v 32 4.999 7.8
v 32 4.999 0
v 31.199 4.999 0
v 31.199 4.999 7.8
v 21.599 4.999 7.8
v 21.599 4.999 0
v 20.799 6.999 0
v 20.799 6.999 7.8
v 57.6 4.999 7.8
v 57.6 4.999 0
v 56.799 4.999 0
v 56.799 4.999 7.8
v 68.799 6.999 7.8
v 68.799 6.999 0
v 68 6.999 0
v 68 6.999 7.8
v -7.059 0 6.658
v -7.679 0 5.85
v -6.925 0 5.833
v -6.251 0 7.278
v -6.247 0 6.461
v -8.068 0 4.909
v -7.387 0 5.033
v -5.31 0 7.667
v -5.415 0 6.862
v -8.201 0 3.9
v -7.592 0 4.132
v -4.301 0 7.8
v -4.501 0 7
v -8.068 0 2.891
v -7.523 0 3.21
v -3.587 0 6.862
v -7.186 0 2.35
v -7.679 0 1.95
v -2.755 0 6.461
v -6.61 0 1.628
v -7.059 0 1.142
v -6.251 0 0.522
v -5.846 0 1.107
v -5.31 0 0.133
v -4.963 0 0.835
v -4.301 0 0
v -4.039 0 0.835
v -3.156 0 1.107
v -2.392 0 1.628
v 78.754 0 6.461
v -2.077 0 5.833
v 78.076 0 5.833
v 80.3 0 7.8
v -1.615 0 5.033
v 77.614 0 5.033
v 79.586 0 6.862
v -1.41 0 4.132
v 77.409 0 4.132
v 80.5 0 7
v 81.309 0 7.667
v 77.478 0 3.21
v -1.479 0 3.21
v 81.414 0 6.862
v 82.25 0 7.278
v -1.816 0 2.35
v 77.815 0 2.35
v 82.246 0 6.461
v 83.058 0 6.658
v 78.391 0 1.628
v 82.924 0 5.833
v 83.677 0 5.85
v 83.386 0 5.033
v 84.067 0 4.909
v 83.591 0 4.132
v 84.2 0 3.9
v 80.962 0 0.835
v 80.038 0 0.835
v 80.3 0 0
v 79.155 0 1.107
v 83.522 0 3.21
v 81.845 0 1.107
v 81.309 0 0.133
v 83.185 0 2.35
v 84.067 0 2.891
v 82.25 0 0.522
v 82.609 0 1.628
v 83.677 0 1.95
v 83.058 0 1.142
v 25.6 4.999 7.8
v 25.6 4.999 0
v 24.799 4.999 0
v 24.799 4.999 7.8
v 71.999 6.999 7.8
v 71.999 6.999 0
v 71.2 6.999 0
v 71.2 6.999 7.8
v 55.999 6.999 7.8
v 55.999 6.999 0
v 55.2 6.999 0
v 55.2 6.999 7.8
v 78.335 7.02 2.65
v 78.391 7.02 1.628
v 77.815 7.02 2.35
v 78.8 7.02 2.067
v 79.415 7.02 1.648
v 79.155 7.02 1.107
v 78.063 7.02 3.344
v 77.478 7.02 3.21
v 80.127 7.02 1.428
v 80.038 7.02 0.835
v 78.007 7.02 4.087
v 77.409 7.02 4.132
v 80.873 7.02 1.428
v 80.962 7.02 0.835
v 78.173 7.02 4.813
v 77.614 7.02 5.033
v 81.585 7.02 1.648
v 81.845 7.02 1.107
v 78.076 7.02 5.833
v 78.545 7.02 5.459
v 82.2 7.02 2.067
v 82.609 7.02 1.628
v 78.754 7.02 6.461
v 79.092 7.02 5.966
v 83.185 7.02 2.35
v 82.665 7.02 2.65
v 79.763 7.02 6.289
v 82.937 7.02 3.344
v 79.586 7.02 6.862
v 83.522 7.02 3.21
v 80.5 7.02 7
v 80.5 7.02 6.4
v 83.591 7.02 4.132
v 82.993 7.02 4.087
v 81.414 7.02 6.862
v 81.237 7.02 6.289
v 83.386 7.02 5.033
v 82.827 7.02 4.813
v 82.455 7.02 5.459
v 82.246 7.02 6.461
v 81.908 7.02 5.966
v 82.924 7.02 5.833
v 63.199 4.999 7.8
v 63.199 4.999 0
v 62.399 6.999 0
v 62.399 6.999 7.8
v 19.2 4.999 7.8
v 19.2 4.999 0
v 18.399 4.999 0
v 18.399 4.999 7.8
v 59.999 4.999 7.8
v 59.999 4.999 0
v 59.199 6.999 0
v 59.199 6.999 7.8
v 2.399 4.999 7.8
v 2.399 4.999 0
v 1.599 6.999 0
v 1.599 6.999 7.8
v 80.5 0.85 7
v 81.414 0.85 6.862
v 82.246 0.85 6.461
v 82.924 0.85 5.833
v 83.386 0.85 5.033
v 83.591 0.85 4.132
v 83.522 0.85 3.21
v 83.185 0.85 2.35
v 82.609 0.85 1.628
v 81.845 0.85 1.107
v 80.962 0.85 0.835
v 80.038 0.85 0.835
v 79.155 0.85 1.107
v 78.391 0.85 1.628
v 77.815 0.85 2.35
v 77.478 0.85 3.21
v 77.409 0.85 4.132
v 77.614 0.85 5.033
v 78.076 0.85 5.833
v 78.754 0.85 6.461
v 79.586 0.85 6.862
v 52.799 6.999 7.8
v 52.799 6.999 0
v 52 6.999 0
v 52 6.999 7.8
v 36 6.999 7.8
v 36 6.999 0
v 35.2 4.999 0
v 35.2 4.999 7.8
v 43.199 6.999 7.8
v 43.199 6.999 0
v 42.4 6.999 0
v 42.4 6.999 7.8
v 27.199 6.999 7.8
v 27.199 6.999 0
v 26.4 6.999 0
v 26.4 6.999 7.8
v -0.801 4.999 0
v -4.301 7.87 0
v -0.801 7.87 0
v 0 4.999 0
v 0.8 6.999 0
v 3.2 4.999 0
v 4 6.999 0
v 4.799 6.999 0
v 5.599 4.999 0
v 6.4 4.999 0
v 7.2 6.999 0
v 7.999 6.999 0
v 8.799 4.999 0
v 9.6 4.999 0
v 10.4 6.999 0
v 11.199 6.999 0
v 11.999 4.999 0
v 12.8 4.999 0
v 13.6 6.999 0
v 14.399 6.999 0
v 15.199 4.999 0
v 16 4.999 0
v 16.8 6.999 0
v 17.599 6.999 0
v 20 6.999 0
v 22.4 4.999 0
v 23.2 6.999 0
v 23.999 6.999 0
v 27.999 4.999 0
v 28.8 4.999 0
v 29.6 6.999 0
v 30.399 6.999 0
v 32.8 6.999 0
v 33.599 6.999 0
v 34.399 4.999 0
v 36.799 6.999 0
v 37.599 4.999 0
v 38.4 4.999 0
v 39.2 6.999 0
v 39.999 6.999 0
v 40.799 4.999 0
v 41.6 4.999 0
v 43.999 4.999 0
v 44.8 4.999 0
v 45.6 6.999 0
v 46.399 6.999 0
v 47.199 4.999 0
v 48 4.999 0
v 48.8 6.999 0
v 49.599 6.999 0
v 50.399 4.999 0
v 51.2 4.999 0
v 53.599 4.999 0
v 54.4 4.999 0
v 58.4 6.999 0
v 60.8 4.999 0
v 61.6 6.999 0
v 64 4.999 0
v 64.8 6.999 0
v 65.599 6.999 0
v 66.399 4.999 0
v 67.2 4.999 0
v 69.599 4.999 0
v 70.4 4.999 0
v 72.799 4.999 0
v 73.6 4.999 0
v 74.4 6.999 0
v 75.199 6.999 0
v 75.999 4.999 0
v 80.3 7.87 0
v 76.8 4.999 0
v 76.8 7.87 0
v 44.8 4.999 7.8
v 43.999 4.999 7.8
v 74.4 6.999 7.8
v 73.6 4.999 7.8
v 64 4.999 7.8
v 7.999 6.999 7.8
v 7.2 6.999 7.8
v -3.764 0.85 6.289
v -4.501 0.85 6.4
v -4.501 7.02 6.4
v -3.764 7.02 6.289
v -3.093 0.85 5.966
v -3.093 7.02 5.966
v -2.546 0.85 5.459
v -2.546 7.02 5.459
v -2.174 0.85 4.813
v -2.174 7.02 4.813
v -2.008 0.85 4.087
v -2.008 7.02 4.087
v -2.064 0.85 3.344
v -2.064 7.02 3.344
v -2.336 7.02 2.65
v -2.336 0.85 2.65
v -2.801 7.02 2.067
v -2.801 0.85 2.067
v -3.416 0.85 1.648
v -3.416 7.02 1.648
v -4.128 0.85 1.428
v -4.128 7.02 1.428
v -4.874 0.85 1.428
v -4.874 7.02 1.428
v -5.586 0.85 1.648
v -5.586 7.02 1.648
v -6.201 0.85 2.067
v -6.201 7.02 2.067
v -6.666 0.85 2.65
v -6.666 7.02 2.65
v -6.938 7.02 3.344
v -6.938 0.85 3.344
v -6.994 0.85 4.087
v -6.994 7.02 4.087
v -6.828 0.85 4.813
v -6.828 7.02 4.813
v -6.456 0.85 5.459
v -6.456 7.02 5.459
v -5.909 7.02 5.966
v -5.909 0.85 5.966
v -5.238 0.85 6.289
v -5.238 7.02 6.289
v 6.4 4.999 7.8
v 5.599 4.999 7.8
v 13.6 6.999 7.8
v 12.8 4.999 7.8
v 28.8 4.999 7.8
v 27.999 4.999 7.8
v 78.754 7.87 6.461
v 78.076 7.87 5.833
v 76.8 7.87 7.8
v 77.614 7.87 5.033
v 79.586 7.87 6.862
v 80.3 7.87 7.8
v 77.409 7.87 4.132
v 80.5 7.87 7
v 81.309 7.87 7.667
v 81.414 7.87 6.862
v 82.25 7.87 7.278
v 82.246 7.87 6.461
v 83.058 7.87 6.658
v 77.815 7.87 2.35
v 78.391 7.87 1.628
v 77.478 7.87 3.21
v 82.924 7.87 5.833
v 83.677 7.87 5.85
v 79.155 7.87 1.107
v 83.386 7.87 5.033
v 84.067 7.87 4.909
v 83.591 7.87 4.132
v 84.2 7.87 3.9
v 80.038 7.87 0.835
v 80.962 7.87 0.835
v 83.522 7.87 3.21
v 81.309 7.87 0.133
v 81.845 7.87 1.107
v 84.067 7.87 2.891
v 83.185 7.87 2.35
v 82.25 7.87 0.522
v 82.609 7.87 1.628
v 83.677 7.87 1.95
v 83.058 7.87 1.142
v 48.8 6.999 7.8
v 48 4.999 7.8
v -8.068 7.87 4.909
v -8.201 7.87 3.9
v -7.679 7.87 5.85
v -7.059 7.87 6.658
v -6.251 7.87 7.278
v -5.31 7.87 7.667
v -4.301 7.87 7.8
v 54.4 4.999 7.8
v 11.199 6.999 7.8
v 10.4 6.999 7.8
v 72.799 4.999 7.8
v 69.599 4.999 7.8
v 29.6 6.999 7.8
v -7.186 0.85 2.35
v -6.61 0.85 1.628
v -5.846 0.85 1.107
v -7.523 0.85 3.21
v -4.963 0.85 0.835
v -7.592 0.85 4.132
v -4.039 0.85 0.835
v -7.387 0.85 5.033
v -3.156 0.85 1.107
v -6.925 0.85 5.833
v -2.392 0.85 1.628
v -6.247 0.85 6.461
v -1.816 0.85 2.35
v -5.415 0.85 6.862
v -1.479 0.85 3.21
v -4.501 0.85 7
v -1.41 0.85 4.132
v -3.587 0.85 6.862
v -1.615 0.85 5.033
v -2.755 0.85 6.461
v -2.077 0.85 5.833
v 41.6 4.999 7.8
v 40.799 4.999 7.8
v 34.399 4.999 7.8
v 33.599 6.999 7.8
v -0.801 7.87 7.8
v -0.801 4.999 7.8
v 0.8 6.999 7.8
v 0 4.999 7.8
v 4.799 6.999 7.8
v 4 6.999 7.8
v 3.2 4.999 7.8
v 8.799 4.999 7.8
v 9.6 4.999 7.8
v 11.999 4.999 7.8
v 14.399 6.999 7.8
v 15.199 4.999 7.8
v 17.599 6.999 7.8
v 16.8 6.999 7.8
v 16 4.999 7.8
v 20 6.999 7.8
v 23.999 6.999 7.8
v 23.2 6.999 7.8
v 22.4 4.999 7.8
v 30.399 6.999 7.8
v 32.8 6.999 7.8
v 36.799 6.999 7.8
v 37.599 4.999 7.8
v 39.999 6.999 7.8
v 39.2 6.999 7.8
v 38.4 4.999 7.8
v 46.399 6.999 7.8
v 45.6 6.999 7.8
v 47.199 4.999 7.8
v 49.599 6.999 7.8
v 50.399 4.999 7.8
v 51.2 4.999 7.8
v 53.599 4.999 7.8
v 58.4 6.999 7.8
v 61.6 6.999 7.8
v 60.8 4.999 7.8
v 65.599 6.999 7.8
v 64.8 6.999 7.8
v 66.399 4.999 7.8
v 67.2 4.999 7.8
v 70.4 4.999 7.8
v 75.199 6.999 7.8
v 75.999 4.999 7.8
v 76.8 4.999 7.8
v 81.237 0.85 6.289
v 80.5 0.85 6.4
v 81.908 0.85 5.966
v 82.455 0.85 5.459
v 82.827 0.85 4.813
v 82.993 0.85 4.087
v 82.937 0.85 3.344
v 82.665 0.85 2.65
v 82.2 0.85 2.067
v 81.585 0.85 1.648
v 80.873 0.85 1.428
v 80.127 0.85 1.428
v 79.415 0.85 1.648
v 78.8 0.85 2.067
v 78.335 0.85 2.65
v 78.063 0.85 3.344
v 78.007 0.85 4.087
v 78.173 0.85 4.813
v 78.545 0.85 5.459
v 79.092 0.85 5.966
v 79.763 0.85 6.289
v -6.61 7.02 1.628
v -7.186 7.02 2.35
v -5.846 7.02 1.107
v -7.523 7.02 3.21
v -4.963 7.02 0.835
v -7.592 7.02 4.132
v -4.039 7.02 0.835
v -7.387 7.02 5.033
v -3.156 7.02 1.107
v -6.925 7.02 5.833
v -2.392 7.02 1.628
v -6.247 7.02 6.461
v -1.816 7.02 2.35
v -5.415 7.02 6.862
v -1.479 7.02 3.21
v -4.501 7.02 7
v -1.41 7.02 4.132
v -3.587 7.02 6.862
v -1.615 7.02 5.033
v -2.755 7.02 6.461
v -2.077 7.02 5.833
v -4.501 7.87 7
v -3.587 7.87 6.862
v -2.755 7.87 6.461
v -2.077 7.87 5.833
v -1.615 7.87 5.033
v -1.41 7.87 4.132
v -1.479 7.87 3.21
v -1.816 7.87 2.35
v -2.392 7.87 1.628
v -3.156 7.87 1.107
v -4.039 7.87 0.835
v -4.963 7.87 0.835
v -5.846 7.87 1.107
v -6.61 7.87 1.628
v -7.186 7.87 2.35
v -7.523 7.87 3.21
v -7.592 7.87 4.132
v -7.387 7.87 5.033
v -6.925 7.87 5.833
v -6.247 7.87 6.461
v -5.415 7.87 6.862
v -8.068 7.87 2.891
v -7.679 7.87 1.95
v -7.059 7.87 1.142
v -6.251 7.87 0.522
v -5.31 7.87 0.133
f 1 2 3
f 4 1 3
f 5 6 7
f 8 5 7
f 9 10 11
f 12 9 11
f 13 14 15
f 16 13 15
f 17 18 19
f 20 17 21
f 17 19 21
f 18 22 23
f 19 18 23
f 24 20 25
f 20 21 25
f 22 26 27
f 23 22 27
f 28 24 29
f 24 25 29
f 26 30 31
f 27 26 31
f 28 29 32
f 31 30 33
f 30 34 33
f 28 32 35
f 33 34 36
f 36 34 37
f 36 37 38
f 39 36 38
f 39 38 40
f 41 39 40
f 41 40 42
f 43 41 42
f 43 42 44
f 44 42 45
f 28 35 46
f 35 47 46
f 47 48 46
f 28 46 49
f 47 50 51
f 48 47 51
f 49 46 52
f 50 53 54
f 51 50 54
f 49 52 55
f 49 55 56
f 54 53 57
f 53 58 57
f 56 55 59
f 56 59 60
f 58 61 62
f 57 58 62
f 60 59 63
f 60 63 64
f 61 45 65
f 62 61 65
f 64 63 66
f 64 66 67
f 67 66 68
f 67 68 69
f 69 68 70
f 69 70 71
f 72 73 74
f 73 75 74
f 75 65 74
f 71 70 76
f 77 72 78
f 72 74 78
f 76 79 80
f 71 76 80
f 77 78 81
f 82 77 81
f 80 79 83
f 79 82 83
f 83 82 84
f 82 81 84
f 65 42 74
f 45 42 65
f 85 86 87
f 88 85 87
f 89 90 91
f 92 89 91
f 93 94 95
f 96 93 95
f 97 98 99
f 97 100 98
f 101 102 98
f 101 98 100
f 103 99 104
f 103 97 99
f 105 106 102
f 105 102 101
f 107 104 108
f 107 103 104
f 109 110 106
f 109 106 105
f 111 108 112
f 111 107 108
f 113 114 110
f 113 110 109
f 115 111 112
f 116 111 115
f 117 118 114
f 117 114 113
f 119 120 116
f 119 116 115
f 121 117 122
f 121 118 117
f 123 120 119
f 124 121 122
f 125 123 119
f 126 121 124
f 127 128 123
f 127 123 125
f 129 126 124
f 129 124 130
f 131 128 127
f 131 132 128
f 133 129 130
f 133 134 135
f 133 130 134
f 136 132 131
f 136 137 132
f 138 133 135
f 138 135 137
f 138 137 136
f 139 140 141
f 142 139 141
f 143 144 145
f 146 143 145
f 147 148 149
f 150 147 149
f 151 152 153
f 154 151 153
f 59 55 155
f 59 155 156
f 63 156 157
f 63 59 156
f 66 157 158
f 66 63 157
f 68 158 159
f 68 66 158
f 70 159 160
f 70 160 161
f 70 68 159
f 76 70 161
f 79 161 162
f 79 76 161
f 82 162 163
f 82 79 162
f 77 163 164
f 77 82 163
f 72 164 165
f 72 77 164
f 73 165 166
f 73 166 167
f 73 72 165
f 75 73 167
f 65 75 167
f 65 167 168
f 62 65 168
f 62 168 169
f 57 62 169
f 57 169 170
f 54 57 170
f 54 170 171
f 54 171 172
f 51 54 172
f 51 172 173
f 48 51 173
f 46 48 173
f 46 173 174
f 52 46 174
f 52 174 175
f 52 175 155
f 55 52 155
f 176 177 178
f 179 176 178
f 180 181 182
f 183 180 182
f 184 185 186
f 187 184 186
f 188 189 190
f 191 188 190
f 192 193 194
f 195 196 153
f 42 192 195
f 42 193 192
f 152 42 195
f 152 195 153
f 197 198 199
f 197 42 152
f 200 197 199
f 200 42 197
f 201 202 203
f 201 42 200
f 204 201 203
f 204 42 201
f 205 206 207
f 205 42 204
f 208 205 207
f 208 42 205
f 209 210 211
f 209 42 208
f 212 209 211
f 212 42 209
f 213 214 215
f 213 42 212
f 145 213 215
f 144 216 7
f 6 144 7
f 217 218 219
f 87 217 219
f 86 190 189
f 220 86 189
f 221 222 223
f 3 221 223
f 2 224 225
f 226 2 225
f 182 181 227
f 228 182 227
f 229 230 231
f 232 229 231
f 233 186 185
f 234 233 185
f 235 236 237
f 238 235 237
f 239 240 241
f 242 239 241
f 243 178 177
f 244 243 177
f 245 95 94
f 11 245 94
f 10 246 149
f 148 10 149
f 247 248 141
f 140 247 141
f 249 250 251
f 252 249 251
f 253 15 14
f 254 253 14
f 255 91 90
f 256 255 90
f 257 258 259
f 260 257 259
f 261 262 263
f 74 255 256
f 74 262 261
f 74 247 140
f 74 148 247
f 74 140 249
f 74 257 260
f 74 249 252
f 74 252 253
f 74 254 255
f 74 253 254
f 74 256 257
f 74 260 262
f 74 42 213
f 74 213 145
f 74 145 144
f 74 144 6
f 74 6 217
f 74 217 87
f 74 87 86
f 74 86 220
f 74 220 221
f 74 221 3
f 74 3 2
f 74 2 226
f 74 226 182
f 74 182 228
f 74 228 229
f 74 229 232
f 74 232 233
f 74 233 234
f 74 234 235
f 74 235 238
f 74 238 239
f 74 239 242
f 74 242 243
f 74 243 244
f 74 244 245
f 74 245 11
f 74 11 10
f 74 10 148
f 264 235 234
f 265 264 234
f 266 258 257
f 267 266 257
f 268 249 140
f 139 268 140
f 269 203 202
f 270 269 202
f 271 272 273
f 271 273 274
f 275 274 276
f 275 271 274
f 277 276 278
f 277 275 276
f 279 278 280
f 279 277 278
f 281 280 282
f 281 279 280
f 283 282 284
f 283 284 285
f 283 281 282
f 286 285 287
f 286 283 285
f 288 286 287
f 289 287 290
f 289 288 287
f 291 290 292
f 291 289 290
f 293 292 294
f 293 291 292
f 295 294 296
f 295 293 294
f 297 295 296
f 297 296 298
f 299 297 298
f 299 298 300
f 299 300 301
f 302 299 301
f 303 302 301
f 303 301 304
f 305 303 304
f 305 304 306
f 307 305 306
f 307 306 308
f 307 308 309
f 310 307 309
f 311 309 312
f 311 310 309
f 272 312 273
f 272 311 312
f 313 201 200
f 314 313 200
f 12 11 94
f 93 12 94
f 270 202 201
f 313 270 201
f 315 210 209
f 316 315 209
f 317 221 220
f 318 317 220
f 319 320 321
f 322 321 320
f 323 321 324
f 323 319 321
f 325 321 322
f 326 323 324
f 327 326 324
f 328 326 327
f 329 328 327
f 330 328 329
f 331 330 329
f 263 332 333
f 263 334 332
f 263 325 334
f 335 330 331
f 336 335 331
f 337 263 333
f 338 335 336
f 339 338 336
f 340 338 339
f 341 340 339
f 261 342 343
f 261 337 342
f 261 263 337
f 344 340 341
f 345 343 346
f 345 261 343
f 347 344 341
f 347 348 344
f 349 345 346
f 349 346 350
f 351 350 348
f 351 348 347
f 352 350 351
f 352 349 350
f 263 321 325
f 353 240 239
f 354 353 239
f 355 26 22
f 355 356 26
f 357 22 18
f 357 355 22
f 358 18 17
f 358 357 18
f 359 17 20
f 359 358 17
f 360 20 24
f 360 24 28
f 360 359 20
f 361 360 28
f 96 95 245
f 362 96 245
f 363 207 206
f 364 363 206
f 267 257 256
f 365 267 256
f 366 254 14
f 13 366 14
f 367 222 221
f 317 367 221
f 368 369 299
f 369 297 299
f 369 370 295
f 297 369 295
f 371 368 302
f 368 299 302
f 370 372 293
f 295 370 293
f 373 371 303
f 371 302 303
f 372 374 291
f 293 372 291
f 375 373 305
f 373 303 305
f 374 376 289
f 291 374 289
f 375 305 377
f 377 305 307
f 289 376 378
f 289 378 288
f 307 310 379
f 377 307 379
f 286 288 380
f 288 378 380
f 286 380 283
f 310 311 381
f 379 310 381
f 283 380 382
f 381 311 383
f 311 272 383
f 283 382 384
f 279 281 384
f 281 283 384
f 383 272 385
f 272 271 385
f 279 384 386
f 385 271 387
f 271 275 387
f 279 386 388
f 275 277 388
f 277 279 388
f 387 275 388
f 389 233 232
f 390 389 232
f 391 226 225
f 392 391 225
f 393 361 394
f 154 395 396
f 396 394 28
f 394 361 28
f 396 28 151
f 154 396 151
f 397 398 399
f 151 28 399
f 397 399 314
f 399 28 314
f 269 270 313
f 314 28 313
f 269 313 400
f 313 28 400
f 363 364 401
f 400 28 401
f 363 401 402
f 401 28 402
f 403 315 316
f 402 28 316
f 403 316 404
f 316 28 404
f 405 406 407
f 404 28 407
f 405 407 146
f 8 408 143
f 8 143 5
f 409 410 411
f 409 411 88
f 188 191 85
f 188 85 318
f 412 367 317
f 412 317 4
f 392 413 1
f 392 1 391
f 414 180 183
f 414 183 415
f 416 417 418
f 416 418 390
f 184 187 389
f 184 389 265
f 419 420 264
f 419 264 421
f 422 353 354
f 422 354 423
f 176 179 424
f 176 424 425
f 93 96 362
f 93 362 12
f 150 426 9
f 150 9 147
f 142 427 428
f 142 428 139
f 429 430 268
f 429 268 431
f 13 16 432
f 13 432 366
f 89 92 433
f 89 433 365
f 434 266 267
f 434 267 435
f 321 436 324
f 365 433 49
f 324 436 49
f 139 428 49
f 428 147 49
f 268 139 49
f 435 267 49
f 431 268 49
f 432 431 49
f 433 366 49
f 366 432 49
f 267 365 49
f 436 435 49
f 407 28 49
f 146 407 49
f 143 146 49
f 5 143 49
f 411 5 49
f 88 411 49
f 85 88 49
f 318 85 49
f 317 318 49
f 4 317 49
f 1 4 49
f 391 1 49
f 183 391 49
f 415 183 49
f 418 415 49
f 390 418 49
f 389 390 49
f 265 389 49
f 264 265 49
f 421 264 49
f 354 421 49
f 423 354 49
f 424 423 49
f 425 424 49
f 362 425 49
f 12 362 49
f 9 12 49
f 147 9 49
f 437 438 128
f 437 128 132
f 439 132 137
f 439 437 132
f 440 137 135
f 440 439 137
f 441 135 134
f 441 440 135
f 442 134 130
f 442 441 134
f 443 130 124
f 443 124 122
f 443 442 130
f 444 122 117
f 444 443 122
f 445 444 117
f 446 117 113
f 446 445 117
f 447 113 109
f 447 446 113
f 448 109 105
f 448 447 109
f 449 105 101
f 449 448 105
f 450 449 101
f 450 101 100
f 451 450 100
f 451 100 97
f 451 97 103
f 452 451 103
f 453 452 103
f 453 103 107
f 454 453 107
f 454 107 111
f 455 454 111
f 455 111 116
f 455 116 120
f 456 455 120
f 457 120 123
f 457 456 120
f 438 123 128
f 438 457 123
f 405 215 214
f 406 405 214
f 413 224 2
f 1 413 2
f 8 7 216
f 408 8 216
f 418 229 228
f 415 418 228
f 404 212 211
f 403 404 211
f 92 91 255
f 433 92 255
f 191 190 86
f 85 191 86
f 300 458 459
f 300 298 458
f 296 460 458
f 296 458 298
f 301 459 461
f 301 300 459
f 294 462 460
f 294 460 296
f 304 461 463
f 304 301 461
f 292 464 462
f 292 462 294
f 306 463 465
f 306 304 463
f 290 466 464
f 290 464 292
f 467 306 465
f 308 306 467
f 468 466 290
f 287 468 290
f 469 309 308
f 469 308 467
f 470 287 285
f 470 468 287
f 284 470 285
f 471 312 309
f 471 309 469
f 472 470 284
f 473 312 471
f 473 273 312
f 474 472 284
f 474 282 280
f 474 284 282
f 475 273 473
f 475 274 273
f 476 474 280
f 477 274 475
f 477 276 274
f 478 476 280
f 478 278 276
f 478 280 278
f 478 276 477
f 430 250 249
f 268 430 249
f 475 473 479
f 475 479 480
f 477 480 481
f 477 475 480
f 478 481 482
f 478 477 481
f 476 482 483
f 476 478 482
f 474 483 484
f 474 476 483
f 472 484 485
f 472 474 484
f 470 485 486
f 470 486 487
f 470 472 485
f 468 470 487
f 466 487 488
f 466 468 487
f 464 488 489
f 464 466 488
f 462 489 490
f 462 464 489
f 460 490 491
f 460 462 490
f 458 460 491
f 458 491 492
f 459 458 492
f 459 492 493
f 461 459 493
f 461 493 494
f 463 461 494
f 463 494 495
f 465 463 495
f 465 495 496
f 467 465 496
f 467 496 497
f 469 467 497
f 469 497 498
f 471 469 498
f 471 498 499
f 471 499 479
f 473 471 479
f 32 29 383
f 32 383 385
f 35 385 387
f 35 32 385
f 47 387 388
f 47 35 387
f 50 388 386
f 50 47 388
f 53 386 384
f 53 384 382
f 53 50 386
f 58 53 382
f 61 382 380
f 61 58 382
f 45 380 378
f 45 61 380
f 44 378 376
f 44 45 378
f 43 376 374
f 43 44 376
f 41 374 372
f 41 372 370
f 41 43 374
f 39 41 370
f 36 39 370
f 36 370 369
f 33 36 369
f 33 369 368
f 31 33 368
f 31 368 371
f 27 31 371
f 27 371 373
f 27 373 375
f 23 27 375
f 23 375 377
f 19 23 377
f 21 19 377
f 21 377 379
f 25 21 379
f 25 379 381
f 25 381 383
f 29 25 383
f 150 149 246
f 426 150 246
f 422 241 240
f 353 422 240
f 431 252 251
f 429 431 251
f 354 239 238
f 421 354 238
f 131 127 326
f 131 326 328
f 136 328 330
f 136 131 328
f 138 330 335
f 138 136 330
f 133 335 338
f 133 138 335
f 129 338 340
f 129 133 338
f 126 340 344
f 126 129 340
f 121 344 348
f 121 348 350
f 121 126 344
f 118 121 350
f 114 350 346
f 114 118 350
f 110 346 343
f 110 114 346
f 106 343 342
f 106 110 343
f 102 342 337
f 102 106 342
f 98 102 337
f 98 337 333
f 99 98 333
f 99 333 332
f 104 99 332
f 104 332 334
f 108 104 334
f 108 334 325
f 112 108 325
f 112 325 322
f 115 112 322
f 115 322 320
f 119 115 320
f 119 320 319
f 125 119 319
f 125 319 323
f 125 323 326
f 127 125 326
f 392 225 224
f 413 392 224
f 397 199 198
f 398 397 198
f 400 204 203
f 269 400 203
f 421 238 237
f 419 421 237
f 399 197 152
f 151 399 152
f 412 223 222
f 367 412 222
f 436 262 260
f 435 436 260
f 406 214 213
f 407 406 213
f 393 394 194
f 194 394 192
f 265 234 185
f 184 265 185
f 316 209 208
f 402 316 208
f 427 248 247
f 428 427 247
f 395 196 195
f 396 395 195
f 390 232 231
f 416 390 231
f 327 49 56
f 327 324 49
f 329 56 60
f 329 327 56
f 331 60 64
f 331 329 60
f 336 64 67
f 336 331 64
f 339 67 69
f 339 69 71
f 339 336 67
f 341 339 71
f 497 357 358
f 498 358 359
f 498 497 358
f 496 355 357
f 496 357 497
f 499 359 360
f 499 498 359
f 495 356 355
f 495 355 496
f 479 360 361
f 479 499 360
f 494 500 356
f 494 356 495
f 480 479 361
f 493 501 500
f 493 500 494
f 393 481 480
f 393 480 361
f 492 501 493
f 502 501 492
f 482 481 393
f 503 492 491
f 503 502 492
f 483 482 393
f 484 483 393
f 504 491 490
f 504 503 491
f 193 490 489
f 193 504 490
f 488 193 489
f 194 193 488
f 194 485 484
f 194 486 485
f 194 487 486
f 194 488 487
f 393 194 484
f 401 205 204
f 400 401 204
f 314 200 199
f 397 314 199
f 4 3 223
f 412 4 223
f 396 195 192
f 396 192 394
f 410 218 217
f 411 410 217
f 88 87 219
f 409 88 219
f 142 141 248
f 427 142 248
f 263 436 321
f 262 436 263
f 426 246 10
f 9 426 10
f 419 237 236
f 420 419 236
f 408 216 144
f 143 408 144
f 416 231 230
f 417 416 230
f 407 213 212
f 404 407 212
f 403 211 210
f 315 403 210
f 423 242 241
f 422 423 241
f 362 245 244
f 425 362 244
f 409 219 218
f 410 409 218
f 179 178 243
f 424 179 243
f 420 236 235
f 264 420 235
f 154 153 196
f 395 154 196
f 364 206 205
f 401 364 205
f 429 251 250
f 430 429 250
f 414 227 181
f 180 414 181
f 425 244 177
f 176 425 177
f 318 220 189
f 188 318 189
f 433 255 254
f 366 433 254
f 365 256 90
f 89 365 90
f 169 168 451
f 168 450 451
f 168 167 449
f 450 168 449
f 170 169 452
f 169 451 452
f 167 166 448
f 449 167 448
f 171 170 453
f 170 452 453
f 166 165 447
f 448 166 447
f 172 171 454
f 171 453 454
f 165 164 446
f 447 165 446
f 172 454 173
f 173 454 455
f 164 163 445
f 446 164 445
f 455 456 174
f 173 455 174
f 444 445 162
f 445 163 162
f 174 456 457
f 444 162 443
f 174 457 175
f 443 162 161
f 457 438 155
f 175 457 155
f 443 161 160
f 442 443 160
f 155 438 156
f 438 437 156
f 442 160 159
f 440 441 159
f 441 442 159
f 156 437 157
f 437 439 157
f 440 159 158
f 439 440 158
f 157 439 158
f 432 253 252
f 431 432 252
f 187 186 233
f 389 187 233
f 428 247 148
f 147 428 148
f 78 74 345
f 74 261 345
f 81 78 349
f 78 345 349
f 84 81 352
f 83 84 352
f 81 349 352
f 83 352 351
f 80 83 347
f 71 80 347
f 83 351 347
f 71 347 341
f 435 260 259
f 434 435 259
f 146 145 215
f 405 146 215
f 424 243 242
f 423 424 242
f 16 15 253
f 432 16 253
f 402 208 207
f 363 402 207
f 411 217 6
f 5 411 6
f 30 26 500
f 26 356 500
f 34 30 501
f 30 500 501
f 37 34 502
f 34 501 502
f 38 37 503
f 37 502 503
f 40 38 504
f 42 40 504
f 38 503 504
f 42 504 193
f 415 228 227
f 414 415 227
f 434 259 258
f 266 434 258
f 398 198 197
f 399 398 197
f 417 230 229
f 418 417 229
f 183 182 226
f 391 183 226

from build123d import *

# Parameters (mm, degrees)
SALIENTE_EXTRUIR1_DEPTH = 7.8
MATRIZL1_DEPTH          = 7.8
CROQUIS2_W              = 7.8
CROQUIS2_H              = 4.999
SALIENTE_EXTRUIR2_DEPTH = 0.801
CROQUIS4_W              = 7.4
CROQUIS4_H              = 7.8
CROQUIS4_R              = 3.1
SALIENTE_EXTRUIR3_DEPTH = 7.87
SALIENTE_EXTRUIR4_START = 0.85
CROQUIS4_3_R            = 3.1
CROQUIS4_3_R_2          = 2.5
SALIENTE_EXTRUIR4_DEPTH = 6.17
REDONDEO2_R             = 3.9


with BuildPart() as part:
    # Croquis1 → Saliente-Extruir1 (new body)
    with BuildSketch(Plane.XY):
        Polygon((0, 0), (3.199966839, 0), (3.199966839, 4.999), (2.398966839, 4.999), (1.598983419, 6.999), (0.799983419, 6.999), (0, 4.999), align=None)
    extrude(amount=SALIENTE_EXTRUIR1_DEPTH)

    # MatrizL1: read off the stored shape, not the designer's step
    # MatrizL1 outline → MatrizL1 (add)
    with BuildSketch(Plane.XY):
        Polygon((0.799983419, 6.999), (0, 4.999), (0, 0), (76.799966839, 0), (76.799966839, 4.999), (75.998966839, 4.999), (75.198983419, 6.999), (74.399983419, 6.999), (73.6, 4.999), (72.798966839, 4.999), (71.998983419, 6.999), (71.199983419, 6.999), (70.4, 4.999), (69.598966839, 4.999), (68.798983419, 6.999), (67.999983419, 6.999), (67.2, 4.999), (66.398966839, 4.999), (65.598983419, 6.999), (64.799983419, 6.999), (64, 4.999), (63.198966839, 4.999), (62.398983419, 6.999), (61.599983419, 6.999), (60.8, 4.999), (59.998966839, 4.999), (59.198983419, 6.999), (58.399983419, 6.999), (57.6, 4.999), (56.798966839, 4.999), (55.998983419, 6.999), (55.199983419, 6.999), (54.4, 4.999), (53.598966839, 4.999), (52.798983419, 6.999), (51.999983419, 6.999), (51.2, 4.999), (50.398966839, 4.999), (49.598983419, 6.999), (48.799983419, 6.999), (48, 4.999), (47.198966839, 4.999), (46.398983419, 6.999), (45.599983419, 6.999), (44.8, 4.999), (43.998966839, 4.999), (43.198983419, 6.999), (42.399983419, 6.999), (41.6, 4.999), (40.798966839, 4.999), (39.998983419, 6.999), (39.199983419, 6.999), (38.4, 4.999), (37.598966839, 4.999), (36.798983419, 6.999), (35.999983419, 6.999), (35.2, 4.999), (34.398966839, 4.999), (33.598983419, 6.999), (32.799983419, 6.999), (32, 4.999), (31.198966839, 4.999), (30.398983419, 6.999), (29.599983419, 6.999), (28.8, 4.999), (27.998966839, 4.999), (27.198983419, 6.999), (26.399983419, 6.999), (25.6, 4.999), (24.798966839, 4.999), (23.998983419, 6.999), (23.199983419, 6.999), (22.4, 4.999), (21.598966839, 4.999), (20.798983419, 6.999), (19.999983419, 6.999), (19.2, 4.999), (18.398966839, 4.999), (17.598983419, 6.999), (16.799983419, 6.999), (16, 4.999), (15.198966839, 4.999), (14.398983419, 6.999), (13.599983419, 6.999), (12.8, 4.999), (11.998966839, 4.999), (11.198983419, 6.999), (10.399983419, 6.999), (9.6, 4.999), (8.798966839, 4.999), (7.998983419, 6.999), (7.199983419, 6.999), (6.4, 4.999), (5.598966839, 4.999), (4.798983419, 6.999), (3.999983419, 6.999), (3.2, 4.999), (2.398966839, 4.999), (1.598983419, 6.999), align=None)
    extrude(amount=MATRIZL1_DEPTH)

    # Croquis2 → Saliente-Extruir2 (add)
    with BuildSketch(Plane.ZY):
        with Locations((3.9, 2.4995)):
            Rectangle(CROQUIS2_W, CROQUIS2_H)
    extrude(amount=SALIENTE_EXTRUIR2_DEPTH)

    # Croquis4 → Saliente-Extruir3 (add)
    # profile 1 of 2: a face of its own
    with BuildSketch(Plane(origin=(0, 0, 0), x_dir=(1, 0, 0), z_dir=(0, 1, 0))):
        with Locations((-4.501, -3.9)):
            Rectangle(CROQUIS4_W, CROQUIS4_H)
        with Locations(Location((-4.501, -3.9, 0), (0, 0, 270))):
            Circle(CROQUIS4_R, mode=Mode.SUBTRACT)
    # profile 2 of 2: a face of its own
    with BuildSketch(Plane(origin=(0, 0, 0), x_dir=(1, 0, 0), z_dir=(0, 1, 0))):
        with Locations((80.499966839, -3.9)):
            Rectangle(CROQUIS4_W, CROQUIS4_H)
        with Locations(Location((80.499966839, -3.9, 0), (0, 0, 270))):
            Circle(CROQUIS4_R, mode=Mode.SUBTRACT)
    extrude(amount=SALIENTE_EXTRUIR3_DEPTH)

    # Croquis4<3> → Saliente-Extruir4 (add)
    # profile 1 of 2: a face of its own
    with BuildSketch(Plane(origin=(0, 0, 0), x_dir=(1, 0, 0), z_dir=(0, 1, 0)).offset(SALIENTE_EXTRUIR4_START)):
        with Locations(Location((-4.501, -3.9, 0), (0, 0, 270))):
            Circle(CROQUIS4_3_R)
        with Locations(Location((-4.501, -3.9, 0), (0, 0, 270))):
            Circle(CROQUIS4_3_R_2, mode=Mode.SUBTRACT)
    # profile 2 of 2: a face of its own
    with BuildSketch(Plane(origin=(0, 0, 0), x_dir=(1, 0, 0), z_dir=(0, 1, 0)).offset(SALIENTE_EXTRUIR4_START)):
        with Locations(Location((80.499966839, -3.9, 0), (0, 0, 270))):
            Circle(CROQUIS4_3_R)
        with Locations(Location((80.499966839, -3.9, 0), (0, 0, 270))):
            Circle(CROQUIS4_3_R_2, mode=Mode.SUBTRACT)
    extrude(amount=SALIENTE_EXTRUIR4_DEPTH)

    # Redondeo2
    redondeo2_edges = [part.edges().sort_by_distance(p)[0] for p in [
        (84.199966839, 3.935, 0),
        (84.199966839, 3.935, 7.8),
        (-8.201, 3.935, 0),
        (-8.201, 3.935, 7.8),
    ]]
    fillet(redondeo2_edges, radius=REDONDEO2_R - 0.0001)  # a hair under: the kernel refuses the full size


solid = part.part
